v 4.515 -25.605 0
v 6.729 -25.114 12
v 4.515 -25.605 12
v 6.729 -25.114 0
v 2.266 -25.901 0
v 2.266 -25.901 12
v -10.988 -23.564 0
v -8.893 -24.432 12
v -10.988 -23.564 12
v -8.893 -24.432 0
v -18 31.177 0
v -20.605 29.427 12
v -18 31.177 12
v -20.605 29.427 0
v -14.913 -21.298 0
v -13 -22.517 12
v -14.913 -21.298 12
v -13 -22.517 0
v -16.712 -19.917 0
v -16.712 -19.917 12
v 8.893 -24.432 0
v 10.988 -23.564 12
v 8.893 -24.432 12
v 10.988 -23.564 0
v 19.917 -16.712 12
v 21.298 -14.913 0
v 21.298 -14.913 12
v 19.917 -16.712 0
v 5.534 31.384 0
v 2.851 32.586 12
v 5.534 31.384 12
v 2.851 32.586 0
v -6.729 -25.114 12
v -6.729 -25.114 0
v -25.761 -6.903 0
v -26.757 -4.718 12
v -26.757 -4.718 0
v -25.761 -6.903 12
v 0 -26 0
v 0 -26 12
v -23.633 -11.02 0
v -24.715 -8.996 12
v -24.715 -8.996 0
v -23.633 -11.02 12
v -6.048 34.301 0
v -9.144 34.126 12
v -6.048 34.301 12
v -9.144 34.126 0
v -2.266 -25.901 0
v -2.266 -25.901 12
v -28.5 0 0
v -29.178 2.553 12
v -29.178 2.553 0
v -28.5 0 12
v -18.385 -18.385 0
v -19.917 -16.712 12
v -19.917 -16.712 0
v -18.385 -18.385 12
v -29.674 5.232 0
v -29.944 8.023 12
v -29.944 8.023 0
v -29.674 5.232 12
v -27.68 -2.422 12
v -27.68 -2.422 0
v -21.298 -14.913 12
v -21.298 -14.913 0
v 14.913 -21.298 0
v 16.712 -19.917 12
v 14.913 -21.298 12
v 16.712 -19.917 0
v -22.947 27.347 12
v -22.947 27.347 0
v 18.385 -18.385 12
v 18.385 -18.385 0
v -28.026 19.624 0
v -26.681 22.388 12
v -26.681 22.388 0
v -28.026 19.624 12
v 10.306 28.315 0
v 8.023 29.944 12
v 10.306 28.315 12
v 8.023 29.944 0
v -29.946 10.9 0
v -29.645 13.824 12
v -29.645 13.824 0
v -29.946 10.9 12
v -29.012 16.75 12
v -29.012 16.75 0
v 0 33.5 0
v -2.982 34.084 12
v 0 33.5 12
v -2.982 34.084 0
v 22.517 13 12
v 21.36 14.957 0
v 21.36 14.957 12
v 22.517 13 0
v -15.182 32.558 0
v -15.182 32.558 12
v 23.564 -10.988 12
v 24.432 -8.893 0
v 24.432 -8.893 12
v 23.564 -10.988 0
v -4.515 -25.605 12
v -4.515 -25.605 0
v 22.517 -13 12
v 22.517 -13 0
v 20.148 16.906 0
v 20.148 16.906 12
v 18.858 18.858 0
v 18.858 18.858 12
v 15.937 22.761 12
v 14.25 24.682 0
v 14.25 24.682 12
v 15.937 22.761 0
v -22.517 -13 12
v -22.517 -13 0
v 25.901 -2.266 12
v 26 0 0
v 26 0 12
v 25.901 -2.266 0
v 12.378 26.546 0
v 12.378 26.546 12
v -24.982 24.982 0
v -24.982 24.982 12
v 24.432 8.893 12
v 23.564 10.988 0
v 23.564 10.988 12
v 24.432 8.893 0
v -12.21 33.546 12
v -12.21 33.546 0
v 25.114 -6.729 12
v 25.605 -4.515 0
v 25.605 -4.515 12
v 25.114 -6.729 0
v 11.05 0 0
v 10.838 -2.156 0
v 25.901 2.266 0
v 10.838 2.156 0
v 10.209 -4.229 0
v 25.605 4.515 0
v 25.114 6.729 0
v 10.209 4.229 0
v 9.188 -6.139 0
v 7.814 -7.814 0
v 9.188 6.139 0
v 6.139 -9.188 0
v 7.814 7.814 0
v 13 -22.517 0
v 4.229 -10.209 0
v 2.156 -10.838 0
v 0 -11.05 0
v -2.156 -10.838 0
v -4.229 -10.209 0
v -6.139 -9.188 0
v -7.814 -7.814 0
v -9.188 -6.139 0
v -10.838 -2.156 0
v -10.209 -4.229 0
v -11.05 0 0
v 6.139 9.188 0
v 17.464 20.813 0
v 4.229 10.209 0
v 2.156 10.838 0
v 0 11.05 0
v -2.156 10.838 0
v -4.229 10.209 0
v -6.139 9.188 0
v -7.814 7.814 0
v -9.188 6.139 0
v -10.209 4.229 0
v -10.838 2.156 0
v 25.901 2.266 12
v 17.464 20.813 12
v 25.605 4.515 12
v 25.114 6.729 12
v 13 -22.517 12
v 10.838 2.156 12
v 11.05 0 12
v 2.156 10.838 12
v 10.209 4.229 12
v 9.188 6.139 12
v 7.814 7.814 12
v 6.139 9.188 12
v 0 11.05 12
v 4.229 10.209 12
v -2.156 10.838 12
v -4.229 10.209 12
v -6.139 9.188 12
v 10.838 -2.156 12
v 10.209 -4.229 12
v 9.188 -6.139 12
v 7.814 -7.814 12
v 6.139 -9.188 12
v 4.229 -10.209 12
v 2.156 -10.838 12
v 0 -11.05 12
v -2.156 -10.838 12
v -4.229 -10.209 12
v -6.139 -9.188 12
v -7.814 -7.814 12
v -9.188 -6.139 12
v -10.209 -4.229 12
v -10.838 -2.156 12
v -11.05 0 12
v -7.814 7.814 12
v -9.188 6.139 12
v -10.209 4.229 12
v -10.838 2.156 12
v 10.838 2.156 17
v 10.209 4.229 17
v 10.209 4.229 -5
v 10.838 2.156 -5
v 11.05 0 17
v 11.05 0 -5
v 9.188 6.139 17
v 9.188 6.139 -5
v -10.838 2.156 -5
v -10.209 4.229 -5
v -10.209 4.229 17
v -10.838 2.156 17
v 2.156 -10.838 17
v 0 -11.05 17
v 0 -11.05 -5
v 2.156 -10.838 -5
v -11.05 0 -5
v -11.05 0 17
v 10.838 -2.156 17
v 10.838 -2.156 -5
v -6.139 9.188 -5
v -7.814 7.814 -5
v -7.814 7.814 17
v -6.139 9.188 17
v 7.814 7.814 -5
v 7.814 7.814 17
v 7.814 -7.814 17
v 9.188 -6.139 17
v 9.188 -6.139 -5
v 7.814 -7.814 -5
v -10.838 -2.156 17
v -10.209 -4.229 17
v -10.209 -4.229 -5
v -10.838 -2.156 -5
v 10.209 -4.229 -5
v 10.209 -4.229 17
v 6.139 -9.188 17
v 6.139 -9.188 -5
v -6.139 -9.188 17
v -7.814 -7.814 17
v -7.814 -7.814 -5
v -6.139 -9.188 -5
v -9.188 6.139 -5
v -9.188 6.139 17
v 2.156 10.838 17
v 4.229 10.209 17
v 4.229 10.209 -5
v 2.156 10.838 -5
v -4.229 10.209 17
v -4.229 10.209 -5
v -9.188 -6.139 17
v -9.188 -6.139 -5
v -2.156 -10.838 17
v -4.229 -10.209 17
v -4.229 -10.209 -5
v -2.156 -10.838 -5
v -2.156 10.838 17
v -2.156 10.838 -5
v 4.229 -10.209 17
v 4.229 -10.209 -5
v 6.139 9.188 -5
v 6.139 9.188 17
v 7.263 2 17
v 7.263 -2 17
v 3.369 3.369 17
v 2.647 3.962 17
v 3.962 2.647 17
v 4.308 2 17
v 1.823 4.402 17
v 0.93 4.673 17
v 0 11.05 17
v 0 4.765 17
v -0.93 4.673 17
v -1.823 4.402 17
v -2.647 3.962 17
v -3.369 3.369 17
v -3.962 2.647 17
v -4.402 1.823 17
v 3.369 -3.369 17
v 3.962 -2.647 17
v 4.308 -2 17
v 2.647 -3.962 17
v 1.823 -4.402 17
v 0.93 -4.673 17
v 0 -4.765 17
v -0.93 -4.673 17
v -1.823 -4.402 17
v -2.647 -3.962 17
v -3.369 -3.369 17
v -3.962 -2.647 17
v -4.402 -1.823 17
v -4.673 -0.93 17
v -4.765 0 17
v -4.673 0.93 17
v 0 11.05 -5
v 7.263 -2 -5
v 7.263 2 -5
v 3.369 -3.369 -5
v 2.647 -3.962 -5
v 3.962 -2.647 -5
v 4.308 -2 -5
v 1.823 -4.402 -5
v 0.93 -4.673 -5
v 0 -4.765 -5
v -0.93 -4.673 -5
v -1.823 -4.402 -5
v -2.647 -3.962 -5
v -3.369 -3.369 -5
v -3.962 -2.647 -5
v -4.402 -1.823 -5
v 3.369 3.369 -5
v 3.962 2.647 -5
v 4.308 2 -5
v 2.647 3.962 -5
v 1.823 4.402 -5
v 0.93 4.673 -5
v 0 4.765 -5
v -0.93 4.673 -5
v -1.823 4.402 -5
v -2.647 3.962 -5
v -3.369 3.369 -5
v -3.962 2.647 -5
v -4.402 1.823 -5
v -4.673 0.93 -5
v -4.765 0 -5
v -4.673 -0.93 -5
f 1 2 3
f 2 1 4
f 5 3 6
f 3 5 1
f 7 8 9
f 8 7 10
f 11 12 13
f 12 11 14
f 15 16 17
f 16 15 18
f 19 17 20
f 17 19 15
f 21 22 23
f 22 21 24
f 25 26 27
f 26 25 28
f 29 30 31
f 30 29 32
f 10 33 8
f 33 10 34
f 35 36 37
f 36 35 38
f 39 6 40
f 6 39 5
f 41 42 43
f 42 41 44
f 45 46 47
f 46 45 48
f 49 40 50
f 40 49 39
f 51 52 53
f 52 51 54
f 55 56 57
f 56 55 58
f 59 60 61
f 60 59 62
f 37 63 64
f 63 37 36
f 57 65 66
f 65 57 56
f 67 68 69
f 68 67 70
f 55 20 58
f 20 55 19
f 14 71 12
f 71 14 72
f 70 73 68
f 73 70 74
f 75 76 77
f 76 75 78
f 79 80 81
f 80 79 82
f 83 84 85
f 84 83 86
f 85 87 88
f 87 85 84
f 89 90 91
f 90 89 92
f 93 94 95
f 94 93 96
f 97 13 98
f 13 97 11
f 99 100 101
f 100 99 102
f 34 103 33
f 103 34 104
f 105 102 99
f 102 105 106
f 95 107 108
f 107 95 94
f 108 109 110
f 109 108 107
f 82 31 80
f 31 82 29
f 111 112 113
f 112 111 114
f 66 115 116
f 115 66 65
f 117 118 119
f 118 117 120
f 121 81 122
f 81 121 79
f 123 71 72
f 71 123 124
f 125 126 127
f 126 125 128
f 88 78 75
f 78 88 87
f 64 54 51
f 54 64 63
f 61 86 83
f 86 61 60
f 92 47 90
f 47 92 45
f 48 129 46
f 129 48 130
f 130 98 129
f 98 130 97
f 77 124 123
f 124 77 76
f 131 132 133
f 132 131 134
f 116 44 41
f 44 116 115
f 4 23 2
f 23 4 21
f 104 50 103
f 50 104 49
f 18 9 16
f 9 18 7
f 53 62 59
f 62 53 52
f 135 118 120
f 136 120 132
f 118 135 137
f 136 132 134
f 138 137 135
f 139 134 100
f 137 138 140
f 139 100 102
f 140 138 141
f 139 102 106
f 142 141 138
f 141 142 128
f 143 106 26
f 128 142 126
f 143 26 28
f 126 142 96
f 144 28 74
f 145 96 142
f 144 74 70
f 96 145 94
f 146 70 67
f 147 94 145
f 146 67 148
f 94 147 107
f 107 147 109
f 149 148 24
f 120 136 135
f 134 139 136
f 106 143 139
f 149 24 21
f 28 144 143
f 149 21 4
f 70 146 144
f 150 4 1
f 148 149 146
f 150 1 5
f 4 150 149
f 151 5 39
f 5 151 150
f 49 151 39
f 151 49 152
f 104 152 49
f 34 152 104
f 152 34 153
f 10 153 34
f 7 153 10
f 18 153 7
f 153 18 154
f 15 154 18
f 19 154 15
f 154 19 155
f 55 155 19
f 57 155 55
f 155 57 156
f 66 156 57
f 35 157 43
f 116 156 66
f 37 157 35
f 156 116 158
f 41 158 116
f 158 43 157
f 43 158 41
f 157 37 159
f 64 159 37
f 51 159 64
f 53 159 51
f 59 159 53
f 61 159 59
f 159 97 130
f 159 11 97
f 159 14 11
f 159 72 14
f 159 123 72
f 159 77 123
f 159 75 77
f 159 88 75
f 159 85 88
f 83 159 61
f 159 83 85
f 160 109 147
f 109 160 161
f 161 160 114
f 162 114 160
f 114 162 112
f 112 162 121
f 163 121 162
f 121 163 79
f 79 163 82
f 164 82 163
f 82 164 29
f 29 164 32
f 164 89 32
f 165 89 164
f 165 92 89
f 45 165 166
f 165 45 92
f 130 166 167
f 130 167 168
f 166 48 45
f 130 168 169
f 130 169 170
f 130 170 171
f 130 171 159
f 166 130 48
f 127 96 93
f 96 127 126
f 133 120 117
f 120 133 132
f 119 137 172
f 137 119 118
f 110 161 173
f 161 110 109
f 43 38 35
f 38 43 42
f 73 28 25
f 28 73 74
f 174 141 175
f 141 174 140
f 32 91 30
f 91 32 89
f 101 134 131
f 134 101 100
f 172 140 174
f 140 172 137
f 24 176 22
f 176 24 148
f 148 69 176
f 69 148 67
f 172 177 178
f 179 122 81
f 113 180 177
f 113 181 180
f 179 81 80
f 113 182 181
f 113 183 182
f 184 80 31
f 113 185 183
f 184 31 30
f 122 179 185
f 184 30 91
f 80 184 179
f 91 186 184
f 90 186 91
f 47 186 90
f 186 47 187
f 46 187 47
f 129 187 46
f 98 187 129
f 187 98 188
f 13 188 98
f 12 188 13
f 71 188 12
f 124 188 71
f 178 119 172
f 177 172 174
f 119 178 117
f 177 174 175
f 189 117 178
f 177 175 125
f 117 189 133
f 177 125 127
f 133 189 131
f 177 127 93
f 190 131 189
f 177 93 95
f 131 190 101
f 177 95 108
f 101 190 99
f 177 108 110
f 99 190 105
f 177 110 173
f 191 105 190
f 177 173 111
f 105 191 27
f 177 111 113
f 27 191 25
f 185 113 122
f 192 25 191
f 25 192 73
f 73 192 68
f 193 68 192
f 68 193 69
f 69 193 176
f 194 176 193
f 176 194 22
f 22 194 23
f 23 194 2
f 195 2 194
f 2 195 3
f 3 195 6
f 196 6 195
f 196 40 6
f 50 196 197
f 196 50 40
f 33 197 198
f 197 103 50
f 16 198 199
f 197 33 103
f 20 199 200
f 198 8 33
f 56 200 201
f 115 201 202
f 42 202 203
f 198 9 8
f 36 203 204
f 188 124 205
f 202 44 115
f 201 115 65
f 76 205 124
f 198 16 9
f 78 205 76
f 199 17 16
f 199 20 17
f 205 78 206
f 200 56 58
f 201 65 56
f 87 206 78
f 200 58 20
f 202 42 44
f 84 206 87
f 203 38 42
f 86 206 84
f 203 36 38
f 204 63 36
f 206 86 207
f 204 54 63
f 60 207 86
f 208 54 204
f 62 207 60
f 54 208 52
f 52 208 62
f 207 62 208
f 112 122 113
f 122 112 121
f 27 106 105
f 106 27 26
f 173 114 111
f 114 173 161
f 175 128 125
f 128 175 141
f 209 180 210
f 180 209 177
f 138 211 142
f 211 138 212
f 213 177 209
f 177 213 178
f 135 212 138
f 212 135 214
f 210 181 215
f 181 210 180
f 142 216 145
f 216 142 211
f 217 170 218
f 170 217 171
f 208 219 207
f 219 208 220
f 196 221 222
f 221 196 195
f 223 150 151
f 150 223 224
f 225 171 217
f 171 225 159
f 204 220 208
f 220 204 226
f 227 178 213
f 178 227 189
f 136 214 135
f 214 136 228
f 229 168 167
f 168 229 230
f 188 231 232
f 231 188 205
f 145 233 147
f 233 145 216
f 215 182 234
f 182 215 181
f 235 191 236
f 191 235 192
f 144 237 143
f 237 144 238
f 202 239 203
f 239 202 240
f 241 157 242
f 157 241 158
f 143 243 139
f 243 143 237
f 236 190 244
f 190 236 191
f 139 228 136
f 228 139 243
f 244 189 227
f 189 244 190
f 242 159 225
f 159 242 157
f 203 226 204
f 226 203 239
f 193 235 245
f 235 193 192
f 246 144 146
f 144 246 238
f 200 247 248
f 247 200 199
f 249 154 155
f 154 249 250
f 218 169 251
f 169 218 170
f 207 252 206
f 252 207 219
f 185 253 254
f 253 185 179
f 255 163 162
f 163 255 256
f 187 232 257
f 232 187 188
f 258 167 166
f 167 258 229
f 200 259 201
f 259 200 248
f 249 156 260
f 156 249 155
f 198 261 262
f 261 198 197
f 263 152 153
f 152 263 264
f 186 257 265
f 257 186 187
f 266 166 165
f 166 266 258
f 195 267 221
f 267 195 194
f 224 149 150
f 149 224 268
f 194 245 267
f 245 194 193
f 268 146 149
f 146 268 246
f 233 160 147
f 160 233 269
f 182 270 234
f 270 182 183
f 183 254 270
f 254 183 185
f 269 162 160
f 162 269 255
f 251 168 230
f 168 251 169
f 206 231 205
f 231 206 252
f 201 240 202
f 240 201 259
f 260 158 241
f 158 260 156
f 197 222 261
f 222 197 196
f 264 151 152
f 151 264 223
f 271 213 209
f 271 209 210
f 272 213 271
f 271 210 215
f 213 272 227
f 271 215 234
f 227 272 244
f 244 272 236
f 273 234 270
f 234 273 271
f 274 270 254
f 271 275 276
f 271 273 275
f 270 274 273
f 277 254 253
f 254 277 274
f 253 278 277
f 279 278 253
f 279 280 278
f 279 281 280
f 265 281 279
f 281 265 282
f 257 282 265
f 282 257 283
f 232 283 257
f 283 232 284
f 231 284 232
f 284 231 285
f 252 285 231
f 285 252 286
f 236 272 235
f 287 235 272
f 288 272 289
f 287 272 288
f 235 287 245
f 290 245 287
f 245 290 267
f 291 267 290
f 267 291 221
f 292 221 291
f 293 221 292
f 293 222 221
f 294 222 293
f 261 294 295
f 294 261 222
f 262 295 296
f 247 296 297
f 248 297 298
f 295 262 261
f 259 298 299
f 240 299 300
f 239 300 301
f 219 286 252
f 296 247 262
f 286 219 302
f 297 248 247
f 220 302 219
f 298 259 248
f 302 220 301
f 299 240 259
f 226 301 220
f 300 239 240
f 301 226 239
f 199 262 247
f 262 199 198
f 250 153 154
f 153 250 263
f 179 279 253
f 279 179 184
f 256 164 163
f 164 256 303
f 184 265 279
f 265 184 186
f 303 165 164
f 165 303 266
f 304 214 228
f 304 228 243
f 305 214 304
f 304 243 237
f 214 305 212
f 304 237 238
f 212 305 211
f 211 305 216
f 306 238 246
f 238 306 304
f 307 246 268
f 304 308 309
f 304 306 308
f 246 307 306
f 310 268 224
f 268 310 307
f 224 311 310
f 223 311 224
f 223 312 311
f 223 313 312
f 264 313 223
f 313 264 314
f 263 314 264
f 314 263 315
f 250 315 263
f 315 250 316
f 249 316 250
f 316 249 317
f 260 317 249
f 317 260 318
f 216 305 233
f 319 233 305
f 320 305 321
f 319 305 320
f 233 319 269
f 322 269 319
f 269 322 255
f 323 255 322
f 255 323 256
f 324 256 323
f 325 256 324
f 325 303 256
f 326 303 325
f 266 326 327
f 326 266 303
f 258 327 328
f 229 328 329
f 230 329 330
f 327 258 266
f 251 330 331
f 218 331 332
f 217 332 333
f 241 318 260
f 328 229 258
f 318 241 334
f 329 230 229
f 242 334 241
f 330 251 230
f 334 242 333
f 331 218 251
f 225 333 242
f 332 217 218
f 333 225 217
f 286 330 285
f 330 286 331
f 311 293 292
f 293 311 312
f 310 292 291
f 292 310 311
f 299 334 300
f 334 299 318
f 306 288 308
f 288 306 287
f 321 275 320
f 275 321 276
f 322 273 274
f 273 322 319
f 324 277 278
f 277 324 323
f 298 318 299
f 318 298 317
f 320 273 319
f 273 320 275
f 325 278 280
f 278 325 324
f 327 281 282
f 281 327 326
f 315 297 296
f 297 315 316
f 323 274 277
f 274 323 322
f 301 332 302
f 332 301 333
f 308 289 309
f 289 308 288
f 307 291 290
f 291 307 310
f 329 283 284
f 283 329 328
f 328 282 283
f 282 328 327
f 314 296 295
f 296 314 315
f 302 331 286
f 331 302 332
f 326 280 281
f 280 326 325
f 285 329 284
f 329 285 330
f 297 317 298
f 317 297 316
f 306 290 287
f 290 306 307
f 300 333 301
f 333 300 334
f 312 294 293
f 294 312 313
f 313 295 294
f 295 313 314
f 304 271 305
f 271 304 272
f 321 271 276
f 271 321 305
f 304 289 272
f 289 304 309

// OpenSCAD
$fn = 32;

// ----------------------------------------------------------------------
// Cam: base radius 26 mm with a 10 mm lift over 180 degrees
// ----------------------------------------------------------------------

// --- parameters (mm) ---
base_r = 26;              // base radius
lift = 10;                // lift height above the base radius
lift_span = 180;          // angular width of the lift
lift_start = 30;          // angle where the lift starts
cam_t = 12;               // cam plate thickness
hub_d = 22.1;             // hub diameter
hub_h = 22;               // hub height
bore_d = 9.53;            // bore
key_w = 4;                // keyway width
key_depth = 2;            // keyway depth

cam_profile = [[26, 0], [25.901, 2.266], [25.605, 4.515], [25.114, 6.729], [24.432, 8.893], [23.564, 10.988], [22.517, 13], [21.36, 14.957], [20.148, 16.906], [18.858, 18.858], [17.464, 20.813], [15.937, 22.761], [14.25, 24.682], [12.378, 26.546], [10.306, 28.315], [8.023, 29.944], [5.534, 31.384], [2.851, 32.586], [0, 33.5], [-2.982, 34.084], [-6.048, 34.301], [-9.144, 34.126], [-12.21, 33.546], [-15.182, 32.558], [-18, 31.177], [-20.605, 29.427], [-22.947, 27.347], [-24.982, 24.982], [-26.681, 22.388], [-28.026, 19.624], [-29.012, 16.75], [-29.645, 13.824], [-29.946, 10.9], [-29.944, 8.023], [-29.674, 5.232], [-29.178, 2.553], [-28.5, 0], [-27.68, -2.422], [-26.757, -4.718], [-25.761, -6.903], [-24.715, -8.996], [-23.633, -11.02], [-22.517, -13], [-21.298, -14.913], [-19.917, -16.712], [-18.385, -18.385], [-16.712, -19.917], [-14.913, -21.298], [-13, -22.517], [-10.988, -23.564], [-8.893, -24.432], [-6.729, -25.114], [-4.515, -25.605], [-2.266, -25.901], [0, -26], [2.266, -25.901], [4.515, -25.605], [6.729, -25.114], [8.893, -24.432], [10.988, -23.564], [13, -22.517], [14.913, -21.298], [16.712, -19.917], [18.385, -18.385], [19.917, -16.712], [21.298, -14.913], [22.517, -13], [23.564, -10.988], [24.432, -8.893], [25.114, -6.729], [25.605, -4.515], [25.901, -2.266]];

difference() {
  union() {
    linear_extrude(height = cam_t) polygon(cam_profile);
    /* hub, proud of the cam plate on both sides */
    translate([0, 0, -5]) cylinder(h = hub_h, d = hub_d);
  }
  /* bore through the hub, 2.5 mm clear on both faces */
  translate([0, 0, -7.5]) cylinder(h = hub_h + 5, d = bore_d);
  /* keyway, milled through the whole hub */
  translate([2.763, -2, -7.5]) cube([4.5, 4, 27]);
}
